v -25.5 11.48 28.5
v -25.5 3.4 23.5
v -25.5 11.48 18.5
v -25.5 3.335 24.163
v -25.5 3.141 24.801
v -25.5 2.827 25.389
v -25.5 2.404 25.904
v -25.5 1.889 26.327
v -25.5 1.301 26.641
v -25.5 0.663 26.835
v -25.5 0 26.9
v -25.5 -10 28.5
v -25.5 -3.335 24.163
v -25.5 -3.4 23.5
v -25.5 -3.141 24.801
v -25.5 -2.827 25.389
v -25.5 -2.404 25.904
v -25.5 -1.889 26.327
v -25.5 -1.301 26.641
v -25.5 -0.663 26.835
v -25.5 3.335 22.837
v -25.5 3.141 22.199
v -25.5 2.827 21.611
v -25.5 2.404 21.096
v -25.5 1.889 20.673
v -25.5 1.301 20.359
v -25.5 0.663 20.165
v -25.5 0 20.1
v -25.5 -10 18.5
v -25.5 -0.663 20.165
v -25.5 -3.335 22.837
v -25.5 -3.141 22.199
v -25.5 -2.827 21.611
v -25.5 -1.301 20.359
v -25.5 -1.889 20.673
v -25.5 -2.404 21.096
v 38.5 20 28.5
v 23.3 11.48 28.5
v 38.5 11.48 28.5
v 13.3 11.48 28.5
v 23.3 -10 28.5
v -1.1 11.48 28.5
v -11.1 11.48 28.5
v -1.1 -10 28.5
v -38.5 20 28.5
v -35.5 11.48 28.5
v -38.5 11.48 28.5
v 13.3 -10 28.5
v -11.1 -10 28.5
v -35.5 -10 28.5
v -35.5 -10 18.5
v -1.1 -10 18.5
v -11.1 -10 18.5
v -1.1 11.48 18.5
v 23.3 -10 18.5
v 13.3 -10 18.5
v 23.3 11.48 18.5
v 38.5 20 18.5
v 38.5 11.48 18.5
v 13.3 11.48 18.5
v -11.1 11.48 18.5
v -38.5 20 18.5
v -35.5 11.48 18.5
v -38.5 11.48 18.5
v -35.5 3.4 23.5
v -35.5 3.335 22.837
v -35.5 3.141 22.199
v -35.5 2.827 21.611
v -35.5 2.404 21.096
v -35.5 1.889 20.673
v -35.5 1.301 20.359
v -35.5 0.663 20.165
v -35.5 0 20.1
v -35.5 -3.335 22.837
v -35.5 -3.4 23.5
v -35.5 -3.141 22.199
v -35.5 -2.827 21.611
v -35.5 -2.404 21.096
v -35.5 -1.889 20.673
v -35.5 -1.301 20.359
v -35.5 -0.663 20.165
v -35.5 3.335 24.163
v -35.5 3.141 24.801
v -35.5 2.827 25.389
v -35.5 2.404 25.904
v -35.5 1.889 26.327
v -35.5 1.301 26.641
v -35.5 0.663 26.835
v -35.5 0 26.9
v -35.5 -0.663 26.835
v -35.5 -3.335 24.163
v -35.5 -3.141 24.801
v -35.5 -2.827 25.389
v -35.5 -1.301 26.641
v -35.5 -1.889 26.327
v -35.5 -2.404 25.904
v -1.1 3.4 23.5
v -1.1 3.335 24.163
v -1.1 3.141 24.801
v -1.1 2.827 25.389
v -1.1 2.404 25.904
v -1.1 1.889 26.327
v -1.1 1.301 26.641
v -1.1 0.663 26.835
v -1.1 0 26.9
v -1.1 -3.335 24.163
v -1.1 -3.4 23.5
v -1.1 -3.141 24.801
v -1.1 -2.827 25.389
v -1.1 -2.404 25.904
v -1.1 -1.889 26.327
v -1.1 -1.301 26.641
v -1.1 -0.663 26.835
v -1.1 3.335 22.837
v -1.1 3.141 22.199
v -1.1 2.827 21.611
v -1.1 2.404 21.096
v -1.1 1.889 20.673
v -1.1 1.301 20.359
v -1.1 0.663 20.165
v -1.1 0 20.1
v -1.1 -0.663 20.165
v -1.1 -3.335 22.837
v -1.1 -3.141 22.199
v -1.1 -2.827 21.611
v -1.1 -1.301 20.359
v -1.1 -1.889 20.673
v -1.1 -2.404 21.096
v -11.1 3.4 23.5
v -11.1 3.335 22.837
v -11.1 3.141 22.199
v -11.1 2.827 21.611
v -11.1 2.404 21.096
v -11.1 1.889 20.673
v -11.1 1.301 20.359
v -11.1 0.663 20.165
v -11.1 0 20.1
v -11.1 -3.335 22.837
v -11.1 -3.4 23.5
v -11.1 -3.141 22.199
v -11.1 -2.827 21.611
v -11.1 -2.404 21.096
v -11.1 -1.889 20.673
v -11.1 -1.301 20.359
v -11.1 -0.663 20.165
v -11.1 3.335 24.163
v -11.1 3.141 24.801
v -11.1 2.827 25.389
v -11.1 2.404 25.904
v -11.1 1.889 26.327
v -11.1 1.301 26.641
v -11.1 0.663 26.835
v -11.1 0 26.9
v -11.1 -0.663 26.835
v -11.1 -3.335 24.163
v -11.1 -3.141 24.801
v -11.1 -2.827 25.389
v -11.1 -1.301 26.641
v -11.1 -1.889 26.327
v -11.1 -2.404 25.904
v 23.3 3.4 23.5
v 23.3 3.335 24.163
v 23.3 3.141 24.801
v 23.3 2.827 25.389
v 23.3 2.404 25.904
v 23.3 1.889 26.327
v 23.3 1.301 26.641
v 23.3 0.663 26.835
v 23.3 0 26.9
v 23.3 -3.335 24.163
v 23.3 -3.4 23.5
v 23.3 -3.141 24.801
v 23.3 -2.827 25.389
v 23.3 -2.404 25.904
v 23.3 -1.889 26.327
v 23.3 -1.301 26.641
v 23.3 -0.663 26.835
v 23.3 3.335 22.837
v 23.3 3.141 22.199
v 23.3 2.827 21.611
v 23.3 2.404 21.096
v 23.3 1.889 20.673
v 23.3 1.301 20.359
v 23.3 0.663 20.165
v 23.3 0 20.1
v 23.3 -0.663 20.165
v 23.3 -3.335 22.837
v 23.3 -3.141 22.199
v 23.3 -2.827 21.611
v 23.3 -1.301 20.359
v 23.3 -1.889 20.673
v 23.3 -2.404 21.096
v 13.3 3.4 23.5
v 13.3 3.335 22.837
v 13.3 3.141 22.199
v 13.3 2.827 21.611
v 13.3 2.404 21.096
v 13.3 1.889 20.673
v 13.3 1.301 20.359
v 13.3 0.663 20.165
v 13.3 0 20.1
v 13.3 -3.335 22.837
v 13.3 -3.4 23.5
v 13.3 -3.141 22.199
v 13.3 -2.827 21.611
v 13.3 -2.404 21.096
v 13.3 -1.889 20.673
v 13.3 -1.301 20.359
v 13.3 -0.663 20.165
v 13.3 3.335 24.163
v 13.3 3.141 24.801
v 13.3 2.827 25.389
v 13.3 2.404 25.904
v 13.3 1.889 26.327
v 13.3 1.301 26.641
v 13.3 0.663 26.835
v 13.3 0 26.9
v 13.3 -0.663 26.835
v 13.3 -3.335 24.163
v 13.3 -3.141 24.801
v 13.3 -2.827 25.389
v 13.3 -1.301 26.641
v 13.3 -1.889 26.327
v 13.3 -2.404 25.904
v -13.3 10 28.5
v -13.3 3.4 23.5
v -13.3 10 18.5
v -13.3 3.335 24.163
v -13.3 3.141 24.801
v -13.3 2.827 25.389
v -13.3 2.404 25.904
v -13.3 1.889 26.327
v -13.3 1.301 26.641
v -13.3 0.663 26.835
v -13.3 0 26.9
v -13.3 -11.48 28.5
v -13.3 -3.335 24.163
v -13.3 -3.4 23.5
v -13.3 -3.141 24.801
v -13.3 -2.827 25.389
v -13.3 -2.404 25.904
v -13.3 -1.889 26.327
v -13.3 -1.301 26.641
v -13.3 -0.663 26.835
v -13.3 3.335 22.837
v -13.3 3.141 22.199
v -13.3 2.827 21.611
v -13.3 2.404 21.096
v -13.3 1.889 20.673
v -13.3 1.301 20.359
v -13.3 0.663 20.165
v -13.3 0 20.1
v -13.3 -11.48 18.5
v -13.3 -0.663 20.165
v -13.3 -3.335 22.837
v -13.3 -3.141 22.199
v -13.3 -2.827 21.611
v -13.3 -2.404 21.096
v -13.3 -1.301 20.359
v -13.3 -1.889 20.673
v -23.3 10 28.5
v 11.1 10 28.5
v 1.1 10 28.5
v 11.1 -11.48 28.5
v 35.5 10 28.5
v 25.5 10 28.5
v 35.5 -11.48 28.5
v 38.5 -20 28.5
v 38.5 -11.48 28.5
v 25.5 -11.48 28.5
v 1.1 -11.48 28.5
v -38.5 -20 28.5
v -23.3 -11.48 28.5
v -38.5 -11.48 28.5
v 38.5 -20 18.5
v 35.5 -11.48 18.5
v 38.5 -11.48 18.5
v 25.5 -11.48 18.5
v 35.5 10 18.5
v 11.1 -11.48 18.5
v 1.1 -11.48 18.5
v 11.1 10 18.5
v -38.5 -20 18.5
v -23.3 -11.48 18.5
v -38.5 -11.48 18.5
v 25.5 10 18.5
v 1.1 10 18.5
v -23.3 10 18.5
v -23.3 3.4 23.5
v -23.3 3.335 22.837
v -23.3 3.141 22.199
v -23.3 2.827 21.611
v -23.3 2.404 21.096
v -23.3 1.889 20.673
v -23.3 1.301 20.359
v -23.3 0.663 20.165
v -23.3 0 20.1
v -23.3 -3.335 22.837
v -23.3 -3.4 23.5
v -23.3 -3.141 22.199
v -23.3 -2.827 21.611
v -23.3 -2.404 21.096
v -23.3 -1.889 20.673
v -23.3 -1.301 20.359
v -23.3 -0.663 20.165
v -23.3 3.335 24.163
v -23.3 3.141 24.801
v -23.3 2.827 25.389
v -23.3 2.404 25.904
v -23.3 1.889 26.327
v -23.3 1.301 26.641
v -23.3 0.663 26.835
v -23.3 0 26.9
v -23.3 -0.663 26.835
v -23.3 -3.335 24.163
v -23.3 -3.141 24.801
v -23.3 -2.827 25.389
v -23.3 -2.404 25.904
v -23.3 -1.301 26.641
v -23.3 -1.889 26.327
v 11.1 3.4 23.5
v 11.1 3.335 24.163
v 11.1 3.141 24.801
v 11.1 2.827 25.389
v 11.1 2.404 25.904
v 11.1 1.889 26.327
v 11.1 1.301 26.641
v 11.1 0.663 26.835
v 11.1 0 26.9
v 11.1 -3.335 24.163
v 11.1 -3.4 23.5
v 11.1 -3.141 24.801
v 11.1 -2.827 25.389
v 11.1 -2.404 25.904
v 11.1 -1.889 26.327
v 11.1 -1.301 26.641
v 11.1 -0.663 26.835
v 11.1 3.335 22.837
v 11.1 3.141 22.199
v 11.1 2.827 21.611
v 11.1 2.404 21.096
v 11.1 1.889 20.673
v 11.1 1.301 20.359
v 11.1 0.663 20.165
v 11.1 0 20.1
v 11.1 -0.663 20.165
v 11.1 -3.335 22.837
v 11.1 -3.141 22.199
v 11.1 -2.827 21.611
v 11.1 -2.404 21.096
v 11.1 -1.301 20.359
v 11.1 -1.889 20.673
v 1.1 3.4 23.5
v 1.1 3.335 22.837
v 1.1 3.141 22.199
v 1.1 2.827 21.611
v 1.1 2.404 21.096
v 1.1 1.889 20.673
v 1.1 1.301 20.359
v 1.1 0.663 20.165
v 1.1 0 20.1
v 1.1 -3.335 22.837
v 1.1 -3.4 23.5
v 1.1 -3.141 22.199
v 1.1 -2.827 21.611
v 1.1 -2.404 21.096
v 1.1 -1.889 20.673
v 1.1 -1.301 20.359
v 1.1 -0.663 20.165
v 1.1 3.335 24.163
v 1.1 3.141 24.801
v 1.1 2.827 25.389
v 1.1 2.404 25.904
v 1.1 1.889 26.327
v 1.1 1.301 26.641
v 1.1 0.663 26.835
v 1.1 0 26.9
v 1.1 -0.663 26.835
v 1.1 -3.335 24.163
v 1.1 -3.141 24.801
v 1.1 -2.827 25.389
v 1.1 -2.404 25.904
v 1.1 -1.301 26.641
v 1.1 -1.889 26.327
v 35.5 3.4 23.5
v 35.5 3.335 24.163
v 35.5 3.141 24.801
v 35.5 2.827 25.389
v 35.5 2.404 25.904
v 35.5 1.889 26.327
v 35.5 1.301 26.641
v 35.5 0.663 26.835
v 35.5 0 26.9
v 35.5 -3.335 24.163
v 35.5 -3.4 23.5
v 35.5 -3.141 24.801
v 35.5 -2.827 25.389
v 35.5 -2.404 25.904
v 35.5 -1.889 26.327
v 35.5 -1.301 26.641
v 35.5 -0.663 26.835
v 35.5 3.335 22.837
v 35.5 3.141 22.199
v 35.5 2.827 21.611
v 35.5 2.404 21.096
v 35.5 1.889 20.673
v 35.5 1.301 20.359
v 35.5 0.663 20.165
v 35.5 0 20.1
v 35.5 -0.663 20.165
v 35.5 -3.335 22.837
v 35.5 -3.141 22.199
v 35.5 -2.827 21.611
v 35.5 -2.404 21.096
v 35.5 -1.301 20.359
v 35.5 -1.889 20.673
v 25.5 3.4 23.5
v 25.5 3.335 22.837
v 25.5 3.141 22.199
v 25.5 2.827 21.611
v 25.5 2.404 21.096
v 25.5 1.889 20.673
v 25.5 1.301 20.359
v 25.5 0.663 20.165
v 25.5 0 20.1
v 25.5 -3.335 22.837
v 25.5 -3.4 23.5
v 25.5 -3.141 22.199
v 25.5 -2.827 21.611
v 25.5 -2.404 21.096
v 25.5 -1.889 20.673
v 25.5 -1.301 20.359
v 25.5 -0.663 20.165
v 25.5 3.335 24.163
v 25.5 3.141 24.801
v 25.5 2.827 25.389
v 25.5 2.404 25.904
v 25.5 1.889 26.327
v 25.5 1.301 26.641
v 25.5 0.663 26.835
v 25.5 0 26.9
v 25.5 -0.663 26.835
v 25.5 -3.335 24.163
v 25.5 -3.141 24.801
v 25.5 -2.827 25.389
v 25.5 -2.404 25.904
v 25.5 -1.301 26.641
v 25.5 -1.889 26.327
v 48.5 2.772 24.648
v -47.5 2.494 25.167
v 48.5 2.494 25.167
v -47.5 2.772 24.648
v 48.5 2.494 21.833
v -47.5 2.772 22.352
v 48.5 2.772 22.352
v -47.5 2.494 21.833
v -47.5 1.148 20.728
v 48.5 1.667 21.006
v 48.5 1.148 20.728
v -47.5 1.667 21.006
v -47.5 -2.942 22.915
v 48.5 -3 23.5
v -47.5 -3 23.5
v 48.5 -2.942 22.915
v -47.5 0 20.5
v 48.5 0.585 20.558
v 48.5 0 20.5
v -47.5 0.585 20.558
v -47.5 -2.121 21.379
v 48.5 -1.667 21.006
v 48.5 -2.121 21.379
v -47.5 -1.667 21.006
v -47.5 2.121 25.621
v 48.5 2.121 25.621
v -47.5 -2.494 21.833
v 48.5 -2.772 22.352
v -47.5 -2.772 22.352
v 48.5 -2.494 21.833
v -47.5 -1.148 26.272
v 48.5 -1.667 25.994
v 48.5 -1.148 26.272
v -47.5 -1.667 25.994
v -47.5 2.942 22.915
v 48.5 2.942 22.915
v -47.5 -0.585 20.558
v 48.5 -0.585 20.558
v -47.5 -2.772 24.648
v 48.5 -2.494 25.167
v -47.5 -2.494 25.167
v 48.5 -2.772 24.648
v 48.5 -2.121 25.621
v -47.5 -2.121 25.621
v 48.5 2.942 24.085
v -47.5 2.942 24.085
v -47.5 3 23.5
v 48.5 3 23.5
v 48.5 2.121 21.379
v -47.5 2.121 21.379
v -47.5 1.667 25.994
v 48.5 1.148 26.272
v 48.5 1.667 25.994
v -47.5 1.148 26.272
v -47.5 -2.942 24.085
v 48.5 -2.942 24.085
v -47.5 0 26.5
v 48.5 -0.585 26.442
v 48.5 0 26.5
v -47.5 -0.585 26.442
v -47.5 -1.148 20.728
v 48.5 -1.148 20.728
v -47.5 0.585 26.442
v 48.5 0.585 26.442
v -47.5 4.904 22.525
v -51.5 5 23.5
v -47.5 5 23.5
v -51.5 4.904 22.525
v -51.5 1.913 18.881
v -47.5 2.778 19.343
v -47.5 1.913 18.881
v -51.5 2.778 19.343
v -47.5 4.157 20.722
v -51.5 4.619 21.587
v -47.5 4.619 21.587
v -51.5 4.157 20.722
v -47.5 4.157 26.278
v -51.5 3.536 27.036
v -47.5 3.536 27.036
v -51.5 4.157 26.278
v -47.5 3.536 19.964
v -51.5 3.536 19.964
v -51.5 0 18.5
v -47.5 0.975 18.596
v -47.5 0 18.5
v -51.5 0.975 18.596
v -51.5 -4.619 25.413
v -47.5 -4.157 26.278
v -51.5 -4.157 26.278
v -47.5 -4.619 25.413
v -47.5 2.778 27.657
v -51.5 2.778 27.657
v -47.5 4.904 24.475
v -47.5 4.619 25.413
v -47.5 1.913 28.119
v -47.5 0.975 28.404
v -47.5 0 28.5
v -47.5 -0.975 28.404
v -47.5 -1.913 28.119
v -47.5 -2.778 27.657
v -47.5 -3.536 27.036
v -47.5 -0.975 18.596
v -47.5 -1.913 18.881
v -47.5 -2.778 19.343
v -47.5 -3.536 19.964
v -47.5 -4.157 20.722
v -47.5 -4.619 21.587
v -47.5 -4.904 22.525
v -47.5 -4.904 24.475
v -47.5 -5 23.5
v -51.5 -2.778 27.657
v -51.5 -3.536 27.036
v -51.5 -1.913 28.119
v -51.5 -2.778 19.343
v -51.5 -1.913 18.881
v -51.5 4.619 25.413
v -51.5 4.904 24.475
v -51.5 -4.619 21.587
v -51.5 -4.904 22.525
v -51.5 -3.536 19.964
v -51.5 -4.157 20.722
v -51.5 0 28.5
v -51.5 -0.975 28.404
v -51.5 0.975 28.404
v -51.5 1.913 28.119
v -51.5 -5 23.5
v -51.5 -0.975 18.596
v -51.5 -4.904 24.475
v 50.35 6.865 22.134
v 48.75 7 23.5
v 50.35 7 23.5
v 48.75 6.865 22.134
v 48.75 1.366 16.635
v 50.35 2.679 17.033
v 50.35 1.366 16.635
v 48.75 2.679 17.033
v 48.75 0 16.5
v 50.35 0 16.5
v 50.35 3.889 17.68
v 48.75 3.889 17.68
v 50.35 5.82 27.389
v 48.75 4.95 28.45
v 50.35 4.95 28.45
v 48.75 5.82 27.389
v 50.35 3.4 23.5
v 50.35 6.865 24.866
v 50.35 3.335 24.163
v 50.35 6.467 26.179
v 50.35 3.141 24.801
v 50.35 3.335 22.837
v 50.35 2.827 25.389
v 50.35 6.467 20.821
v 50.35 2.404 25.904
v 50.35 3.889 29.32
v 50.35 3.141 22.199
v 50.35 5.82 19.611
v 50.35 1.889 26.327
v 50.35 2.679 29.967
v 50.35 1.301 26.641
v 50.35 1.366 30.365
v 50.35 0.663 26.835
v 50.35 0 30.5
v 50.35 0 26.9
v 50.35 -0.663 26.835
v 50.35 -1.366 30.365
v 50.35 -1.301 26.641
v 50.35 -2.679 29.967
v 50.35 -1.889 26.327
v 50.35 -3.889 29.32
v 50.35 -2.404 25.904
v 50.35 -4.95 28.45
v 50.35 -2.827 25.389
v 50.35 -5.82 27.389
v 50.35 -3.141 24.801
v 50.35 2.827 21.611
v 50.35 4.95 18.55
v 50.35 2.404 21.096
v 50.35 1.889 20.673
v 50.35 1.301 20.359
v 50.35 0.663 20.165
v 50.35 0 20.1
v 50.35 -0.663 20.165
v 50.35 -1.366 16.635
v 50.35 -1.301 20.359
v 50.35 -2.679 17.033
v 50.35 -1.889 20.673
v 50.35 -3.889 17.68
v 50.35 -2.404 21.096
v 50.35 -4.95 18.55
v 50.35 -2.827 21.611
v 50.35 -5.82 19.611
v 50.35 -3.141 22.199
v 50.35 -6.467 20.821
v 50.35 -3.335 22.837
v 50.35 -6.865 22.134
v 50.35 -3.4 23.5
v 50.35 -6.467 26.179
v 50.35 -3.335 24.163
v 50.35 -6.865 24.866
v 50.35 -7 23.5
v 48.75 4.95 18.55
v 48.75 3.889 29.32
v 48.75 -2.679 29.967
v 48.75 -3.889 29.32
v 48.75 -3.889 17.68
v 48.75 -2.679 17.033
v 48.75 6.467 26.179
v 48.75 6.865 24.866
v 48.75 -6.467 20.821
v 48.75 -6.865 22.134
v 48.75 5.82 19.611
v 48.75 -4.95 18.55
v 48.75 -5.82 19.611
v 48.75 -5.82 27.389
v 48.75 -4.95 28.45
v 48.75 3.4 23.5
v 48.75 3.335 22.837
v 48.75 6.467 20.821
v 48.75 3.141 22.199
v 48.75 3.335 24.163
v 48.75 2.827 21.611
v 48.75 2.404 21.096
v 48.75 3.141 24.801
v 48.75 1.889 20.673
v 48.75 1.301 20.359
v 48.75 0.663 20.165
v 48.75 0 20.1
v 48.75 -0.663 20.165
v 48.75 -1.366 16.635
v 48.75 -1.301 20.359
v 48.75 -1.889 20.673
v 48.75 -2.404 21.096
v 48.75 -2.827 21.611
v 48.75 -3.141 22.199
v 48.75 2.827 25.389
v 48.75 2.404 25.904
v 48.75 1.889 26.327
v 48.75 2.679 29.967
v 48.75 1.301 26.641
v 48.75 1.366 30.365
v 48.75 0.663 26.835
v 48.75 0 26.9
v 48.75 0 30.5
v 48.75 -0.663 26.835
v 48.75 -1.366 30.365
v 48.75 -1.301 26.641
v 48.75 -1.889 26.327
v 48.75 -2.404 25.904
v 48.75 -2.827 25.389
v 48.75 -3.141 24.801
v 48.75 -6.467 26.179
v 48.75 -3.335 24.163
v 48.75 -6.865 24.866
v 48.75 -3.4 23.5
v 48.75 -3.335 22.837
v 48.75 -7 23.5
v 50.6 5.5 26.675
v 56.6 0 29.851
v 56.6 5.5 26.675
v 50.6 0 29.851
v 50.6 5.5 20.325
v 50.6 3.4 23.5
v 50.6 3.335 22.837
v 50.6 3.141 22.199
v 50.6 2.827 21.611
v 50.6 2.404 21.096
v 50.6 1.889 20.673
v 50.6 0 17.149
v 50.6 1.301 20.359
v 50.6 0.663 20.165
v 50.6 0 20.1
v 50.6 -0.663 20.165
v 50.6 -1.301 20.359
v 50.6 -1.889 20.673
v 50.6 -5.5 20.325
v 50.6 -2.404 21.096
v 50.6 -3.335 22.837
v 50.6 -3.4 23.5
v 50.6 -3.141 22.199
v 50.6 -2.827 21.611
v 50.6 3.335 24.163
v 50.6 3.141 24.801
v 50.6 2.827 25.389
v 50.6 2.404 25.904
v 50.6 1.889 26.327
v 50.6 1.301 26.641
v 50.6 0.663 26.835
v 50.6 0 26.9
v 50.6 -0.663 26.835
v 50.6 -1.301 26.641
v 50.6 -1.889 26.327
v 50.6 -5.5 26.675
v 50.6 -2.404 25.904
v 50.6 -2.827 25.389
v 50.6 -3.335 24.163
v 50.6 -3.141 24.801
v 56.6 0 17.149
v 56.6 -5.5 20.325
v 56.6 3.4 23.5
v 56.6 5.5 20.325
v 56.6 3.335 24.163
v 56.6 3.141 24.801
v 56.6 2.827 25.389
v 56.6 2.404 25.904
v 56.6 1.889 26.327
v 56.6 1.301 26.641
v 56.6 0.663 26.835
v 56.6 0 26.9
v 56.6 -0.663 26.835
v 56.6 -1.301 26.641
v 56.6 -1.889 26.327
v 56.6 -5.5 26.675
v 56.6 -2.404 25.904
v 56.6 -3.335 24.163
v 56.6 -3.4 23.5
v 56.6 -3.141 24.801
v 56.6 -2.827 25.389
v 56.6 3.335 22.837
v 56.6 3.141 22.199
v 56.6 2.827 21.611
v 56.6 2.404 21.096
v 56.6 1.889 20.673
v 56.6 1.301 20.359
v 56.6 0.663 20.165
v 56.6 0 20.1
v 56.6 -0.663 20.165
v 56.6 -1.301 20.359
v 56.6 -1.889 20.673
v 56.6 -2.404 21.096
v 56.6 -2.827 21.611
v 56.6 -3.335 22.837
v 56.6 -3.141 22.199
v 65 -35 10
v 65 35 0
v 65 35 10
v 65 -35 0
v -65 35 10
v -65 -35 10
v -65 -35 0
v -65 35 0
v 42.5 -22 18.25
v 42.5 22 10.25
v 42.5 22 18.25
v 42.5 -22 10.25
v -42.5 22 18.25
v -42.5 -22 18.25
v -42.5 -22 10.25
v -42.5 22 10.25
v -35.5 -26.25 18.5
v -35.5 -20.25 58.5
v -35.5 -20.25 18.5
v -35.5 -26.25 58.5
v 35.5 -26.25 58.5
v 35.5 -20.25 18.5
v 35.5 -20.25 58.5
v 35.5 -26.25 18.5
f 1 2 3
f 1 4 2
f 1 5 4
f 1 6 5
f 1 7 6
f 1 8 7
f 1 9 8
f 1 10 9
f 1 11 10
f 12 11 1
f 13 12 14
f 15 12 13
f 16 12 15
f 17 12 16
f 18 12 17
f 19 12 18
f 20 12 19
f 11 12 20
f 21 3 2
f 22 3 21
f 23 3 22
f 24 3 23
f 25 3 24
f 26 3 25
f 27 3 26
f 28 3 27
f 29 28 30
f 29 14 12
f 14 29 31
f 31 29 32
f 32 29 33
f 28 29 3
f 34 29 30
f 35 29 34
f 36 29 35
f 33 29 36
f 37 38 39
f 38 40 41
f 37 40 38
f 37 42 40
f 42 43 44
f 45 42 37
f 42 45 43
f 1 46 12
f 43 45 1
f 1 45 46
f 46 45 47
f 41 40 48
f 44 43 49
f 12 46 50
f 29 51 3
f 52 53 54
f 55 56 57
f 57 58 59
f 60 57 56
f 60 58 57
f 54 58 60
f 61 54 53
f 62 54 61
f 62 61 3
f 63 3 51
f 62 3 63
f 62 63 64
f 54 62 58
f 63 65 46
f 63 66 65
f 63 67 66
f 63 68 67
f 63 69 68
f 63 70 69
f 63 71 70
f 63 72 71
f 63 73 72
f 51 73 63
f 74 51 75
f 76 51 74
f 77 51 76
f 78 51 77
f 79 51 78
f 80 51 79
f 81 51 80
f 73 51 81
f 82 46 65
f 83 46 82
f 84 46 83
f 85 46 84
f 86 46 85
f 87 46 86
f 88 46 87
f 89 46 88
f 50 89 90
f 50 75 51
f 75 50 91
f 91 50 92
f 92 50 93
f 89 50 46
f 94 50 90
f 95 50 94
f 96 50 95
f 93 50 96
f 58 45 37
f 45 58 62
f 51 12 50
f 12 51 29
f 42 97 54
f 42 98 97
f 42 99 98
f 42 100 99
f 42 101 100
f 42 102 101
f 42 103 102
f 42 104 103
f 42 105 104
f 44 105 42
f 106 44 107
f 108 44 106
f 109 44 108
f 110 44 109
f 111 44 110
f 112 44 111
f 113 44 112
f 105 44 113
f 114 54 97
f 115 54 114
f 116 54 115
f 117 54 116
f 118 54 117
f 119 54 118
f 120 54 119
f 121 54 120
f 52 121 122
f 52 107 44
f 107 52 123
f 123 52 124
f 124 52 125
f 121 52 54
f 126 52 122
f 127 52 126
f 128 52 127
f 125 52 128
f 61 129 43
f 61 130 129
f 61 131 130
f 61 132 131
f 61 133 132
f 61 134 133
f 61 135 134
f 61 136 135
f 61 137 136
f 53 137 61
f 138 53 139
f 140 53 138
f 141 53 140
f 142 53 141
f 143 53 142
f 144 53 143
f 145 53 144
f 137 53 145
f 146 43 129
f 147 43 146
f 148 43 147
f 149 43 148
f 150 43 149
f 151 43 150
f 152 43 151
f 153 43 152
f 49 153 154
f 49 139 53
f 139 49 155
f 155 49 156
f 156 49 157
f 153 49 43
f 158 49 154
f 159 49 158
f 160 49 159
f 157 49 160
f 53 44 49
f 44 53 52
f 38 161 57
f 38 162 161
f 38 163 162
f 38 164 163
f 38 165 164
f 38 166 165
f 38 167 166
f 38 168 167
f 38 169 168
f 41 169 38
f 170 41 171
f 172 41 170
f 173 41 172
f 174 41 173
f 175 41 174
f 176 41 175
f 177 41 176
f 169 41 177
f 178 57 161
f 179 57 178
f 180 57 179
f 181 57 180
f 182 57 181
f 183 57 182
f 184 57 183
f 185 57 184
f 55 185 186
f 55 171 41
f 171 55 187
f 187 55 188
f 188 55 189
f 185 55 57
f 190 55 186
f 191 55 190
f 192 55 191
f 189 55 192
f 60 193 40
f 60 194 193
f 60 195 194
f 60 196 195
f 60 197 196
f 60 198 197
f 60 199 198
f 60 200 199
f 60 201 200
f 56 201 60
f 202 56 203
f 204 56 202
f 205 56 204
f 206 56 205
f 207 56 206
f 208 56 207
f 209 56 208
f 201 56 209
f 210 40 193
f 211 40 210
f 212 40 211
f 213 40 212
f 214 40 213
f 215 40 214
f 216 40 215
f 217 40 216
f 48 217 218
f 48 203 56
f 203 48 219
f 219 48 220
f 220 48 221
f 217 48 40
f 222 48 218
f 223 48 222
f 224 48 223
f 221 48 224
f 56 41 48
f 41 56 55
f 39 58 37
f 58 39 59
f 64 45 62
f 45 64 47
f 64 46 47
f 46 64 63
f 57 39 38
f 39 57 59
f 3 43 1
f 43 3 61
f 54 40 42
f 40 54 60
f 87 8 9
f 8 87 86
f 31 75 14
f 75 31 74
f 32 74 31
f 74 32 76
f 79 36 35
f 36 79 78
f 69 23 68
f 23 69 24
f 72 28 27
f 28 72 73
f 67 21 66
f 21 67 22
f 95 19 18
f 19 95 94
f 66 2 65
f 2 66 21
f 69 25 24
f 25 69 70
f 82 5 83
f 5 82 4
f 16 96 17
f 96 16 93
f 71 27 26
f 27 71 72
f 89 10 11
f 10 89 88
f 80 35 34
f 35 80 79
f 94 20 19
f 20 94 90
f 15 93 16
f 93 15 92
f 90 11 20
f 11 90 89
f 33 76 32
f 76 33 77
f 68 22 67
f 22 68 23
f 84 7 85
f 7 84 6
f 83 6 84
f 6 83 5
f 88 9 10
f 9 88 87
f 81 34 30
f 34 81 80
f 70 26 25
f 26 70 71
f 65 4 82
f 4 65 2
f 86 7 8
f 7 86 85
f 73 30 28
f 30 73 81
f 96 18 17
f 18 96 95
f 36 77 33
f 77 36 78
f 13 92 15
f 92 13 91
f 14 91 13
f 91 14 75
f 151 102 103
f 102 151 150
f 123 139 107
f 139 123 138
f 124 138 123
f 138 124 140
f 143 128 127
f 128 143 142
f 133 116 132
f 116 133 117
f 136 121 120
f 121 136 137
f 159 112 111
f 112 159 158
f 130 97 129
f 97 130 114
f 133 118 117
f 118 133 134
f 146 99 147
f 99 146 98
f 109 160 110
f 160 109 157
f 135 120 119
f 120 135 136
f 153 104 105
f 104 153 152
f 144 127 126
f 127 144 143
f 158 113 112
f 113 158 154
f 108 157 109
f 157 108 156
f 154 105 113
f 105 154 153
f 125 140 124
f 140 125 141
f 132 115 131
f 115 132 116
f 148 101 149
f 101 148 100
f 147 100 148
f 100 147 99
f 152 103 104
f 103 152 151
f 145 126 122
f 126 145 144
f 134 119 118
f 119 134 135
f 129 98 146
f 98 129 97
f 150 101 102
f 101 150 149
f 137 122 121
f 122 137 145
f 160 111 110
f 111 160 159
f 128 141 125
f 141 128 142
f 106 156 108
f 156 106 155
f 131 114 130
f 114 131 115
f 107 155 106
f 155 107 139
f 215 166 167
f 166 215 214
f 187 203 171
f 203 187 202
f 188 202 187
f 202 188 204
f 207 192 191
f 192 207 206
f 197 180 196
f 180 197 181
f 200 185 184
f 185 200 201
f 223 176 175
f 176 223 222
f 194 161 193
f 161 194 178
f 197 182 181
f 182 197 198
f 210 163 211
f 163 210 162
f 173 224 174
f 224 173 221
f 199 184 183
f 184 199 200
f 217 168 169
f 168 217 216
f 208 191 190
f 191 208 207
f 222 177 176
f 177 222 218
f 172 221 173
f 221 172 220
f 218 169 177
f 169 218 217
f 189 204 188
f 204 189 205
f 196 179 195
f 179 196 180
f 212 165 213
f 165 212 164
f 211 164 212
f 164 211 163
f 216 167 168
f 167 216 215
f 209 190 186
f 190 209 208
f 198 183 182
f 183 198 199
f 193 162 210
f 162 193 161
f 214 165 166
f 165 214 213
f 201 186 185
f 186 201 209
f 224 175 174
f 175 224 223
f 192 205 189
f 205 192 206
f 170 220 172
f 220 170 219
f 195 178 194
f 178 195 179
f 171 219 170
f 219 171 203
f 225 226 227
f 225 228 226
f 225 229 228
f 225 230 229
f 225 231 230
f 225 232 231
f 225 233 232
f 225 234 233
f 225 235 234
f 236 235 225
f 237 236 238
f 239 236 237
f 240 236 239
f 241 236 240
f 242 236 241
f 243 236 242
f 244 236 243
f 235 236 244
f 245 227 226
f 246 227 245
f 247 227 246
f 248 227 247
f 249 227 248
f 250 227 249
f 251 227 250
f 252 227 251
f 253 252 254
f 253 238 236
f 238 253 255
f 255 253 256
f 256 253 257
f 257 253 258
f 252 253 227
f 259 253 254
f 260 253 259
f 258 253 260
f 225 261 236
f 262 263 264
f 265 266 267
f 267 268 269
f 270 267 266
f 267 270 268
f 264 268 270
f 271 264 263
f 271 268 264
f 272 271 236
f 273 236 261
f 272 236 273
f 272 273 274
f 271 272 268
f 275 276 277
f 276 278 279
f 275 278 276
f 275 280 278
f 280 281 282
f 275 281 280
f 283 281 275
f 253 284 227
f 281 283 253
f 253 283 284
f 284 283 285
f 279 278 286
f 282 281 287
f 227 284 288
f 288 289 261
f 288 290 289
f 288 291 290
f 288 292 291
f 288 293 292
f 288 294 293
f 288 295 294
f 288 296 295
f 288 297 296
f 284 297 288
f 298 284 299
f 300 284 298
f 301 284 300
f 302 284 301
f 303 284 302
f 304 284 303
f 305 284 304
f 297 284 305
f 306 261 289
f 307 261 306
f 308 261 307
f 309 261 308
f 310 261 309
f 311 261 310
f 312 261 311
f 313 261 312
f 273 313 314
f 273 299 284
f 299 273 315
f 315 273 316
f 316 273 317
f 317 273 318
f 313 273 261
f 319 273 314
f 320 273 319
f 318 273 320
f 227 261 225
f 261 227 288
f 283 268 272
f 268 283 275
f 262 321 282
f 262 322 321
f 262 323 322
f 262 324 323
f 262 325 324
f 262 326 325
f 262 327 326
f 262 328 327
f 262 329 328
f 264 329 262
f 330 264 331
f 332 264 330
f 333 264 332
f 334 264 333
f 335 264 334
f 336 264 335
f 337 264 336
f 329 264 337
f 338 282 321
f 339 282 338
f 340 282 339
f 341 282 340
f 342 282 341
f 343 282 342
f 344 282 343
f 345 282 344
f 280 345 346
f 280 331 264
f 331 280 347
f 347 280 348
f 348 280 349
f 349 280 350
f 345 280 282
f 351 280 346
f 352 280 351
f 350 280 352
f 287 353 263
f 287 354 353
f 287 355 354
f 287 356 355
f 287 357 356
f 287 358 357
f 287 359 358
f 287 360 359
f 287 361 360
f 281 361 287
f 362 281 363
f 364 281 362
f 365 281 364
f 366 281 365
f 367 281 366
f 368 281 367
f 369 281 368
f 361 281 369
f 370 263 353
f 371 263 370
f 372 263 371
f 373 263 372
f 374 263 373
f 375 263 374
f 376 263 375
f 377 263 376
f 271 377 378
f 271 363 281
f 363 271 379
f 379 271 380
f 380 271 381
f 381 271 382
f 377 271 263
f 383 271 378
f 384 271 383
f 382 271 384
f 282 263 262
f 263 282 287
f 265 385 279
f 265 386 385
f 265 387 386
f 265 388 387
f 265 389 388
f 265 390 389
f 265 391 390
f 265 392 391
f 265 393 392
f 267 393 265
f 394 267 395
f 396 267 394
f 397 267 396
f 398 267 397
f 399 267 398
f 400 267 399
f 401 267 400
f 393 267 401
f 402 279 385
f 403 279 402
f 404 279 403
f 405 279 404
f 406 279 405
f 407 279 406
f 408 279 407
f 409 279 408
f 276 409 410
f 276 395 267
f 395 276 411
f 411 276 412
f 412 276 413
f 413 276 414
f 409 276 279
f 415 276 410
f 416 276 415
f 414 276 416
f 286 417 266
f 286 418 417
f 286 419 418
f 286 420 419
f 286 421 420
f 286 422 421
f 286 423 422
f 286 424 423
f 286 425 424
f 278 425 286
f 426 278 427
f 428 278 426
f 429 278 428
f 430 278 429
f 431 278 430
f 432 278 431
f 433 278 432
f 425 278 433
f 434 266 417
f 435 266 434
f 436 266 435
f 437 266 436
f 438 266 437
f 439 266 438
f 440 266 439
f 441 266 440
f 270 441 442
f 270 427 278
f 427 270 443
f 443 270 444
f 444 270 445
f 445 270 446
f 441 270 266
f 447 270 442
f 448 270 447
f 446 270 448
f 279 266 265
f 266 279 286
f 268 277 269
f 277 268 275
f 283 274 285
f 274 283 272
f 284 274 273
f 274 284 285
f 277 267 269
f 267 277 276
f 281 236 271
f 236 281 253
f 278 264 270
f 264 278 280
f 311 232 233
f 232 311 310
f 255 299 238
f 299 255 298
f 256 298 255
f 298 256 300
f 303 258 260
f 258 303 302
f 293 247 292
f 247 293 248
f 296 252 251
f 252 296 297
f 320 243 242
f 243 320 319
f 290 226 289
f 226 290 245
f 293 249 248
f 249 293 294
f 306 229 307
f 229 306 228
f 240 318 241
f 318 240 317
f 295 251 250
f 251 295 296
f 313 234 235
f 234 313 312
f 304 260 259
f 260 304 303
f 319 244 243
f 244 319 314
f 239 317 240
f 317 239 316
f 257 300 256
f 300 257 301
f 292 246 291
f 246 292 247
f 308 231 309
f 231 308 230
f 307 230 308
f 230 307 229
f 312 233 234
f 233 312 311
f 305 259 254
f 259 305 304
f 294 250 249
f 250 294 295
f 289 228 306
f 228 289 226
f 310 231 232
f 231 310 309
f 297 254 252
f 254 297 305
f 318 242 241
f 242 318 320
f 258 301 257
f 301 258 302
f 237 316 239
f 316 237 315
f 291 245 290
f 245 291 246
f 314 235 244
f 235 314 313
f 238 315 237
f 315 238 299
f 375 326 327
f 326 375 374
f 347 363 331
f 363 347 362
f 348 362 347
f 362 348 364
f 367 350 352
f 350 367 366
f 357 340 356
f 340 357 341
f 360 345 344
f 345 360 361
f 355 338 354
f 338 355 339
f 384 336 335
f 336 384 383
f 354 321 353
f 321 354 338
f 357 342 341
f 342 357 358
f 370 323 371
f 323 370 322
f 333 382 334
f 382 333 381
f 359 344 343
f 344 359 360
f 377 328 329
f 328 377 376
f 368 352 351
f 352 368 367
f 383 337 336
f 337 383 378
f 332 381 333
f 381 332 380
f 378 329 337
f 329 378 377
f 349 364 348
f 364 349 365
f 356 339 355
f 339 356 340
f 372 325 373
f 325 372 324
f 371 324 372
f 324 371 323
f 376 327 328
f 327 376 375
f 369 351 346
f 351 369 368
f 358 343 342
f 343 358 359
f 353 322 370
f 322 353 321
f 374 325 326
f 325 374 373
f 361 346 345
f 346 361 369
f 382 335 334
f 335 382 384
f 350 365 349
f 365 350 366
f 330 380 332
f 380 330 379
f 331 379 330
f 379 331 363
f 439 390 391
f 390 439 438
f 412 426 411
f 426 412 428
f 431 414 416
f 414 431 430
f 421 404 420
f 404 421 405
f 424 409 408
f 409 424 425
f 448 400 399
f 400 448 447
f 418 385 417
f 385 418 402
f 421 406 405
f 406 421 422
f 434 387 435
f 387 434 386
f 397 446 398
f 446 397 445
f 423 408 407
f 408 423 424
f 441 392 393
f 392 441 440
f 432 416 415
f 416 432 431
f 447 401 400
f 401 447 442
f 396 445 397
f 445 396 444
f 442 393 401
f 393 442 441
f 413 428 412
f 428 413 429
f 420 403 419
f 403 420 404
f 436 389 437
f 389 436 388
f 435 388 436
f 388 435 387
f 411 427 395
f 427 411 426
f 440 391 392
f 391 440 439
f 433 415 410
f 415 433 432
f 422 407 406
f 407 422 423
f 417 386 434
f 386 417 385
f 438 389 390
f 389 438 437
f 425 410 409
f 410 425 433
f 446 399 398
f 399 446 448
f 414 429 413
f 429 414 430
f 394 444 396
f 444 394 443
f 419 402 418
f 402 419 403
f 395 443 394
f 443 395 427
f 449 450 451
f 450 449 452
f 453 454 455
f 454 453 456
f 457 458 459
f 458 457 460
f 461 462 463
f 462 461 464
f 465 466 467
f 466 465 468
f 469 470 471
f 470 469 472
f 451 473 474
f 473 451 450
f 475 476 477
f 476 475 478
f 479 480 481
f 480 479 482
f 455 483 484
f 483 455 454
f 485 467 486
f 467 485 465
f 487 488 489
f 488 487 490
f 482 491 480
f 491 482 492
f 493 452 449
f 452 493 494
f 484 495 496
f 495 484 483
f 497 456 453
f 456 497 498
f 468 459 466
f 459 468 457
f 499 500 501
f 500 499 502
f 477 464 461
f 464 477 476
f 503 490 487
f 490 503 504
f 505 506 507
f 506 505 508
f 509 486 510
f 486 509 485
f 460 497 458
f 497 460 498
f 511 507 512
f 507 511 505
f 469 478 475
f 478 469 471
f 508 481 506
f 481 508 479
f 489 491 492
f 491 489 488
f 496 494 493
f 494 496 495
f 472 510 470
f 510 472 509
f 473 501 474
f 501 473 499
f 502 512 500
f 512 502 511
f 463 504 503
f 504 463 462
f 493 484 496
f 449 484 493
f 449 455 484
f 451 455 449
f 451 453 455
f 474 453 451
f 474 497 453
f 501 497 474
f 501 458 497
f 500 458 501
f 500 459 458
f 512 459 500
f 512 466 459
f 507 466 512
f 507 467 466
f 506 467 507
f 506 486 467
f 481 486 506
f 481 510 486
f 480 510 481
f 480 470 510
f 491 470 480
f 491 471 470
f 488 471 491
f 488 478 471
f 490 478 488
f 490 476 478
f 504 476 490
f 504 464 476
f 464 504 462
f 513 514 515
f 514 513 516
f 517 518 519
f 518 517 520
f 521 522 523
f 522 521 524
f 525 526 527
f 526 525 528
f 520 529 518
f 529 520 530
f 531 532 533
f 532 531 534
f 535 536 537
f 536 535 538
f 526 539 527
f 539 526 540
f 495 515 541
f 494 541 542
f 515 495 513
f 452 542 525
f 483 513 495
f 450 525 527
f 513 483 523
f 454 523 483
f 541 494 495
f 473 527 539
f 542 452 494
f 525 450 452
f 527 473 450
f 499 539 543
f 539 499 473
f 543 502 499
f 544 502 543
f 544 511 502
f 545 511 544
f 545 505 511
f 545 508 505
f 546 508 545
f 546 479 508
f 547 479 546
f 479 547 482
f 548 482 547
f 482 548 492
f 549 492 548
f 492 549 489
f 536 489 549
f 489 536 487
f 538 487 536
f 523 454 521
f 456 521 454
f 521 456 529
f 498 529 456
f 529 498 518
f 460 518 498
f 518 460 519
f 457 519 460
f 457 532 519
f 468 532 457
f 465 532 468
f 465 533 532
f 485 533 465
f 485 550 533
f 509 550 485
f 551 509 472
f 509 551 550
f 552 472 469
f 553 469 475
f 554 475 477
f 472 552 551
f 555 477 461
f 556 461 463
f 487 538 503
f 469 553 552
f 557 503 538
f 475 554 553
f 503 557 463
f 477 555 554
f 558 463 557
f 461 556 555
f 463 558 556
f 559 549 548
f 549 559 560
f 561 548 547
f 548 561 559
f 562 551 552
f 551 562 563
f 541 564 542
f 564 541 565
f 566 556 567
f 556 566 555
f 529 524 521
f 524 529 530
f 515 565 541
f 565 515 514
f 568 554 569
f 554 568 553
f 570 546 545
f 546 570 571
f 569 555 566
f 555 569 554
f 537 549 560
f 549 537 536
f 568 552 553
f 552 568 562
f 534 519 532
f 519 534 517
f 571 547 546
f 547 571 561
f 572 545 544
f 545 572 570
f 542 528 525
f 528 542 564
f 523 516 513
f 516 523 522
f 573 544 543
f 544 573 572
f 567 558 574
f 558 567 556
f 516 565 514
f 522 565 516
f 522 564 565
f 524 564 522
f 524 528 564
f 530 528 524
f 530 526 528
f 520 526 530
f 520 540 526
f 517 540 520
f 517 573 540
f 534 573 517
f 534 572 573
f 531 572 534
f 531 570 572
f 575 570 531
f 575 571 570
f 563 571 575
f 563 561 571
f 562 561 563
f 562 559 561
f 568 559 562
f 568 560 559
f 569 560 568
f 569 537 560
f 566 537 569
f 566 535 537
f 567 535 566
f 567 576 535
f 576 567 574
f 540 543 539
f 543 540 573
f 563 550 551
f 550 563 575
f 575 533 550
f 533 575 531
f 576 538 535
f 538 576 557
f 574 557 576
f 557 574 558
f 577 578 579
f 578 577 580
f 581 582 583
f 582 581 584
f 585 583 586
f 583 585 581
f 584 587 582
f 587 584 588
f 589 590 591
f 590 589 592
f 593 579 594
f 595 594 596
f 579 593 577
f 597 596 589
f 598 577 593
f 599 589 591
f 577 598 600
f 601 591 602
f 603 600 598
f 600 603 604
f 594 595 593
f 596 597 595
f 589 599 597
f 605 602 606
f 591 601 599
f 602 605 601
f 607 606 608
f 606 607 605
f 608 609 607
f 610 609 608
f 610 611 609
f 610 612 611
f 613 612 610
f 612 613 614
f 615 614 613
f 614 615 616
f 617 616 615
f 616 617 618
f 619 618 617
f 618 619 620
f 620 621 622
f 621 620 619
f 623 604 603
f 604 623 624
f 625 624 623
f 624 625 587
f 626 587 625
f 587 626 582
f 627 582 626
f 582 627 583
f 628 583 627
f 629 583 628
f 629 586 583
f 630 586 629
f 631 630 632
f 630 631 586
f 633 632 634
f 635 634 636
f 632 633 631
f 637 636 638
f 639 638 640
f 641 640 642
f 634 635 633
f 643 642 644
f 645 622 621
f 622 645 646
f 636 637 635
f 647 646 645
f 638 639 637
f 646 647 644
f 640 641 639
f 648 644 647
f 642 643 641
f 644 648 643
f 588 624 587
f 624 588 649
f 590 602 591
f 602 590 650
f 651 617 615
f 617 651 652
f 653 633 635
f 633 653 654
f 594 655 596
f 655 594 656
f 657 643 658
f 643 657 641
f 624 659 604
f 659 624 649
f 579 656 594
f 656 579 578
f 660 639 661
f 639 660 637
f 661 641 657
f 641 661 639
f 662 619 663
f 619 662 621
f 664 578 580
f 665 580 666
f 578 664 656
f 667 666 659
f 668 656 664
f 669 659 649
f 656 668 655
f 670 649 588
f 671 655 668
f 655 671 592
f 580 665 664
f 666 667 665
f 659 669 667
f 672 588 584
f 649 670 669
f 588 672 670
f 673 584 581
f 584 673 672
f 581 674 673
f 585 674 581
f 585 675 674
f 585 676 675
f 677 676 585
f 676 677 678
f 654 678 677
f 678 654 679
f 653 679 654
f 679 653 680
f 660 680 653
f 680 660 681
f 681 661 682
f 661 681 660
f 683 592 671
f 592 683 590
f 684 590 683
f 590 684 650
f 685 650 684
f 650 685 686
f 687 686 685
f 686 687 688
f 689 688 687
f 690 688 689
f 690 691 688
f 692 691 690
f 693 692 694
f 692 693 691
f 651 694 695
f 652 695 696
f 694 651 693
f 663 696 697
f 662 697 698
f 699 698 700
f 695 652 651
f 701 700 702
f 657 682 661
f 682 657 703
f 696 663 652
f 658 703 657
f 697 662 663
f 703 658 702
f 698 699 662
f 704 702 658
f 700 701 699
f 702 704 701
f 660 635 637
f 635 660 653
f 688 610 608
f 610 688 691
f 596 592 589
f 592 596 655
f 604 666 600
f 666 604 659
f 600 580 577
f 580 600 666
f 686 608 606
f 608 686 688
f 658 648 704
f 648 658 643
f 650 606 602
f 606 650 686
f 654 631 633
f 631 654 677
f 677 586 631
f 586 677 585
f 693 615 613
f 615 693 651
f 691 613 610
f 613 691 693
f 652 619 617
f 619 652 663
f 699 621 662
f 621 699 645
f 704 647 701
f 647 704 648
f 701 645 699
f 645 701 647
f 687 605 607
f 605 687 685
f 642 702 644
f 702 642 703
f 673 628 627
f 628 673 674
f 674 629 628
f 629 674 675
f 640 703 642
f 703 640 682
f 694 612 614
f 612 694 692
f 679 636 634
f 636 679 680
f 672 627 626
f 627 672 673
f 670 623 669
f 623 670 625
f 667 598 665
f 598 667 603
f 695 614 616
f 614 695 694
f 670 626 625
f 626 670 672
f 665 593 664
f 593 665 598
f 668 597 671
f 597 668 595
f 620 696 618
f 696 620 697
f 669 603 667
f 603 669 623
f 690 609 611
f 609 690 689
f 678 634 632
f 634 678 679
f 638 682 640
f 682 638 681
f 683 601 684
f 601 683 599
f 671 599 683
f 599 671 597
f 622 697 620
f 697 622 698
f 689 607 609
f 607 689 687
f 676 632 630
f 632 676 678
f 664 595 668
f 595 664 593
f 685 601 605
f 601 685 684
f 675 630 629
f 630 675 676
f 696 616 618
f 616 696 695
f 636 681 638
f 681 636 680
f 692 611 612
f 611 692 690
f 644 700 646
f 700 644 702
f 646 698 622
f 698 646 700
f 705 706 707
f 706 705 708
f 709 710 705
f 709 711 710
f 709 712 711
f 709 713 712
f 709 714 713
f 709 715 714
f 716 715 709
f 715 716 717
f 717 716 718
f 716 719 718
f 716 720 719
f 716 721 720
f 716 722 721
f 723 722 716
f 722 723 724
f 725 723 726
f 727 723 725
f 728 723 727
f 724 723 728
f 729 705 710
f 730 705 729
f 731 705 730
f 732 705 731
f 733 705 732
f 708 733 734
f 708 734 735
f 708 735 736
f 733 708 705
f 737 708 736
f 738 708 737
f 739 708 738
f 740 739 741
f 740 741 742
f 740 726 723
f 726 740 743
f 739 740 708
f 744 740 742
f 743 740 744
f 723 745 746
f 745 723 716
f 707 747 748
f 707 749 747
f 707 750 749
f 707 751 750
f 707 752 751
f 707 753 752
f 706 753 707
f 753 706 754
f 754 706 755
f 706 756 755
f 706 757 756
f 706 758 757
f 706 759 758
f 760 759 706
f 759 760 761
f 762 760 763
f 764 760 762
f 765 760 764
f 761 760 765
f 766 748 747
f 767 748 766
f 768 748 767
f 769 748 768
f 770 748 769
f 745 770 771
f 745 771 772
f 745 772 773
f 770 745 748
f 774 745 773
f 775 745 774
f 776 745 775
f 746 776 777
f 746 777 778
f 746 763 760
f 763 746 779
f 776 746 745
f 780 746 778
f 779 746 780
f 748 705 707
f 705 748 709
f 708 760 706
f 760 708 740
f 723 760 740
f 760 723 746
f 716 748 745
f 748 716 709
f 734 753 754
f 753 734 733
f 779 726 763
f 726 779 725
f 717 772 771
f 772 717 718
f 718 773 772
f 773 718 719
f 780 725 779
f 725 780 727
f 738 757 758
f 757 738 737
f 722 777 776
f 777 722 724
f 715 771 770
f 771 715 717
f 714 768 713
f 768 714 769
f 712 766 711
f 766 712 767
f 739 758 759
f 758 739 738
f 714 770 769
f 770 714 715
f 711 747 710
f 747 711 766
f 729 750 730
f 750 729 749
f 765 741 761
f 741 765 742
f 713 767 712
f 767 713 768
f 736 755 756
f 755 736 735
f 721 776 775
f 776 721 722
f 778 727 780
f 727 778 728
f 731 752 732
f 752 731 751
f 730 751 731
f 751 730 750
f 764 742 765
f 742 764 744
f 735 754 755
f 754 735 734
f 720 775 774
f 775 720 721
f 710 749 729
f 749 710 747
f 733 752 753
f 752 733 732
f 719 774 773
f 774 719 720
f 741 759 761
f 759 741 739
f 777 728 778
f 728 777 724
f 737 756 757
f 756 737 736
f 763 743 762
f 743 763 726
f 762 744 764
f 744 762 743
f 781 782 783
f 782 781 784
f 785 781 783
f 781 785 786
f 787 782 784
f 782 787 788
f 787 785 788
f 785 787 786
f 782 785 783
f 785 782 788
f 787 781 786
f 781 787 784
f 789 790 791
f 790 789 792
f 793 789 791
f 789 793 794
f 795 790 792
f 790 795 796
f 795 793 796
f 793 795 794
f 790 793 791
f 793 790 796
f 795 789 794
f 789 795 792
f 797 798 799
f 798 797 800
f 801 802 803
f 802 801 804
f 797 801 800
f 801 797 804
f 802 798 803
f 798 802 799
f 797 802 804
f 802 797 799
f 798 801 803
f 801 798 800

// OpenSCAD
$fn = 32;

// ------------------------------------------------------------------------
// Comb hinge with flap: leaf 77 x 20 mm, pin d6, flap 40 mm
// Every part is its own module, assembly() places every instance.
// ------------------------------------------------------------------------

// --- part 1 ---
module hinge_bed() {
  difference() {
    translate([-65, -35, 0]) cube([130, 70, 10]);
  }
}

// --- part 2 ---
module hinge_riser() {
  difference() {
    translate([-42.5, -22, 0]) cube([85, 44, 8]);
  }
}

// --- part 3 ---
module hinge_leaf_a() {
  difference() {
    union() {
      translate([-35.5, -10, -5]) cube([10, 30, 10]);
      translate([-11.1, -10, -5]) cube([10, 30, 10]);
      translate([13.3, -10, -5]) cube([10, 30, 10]);
      translate([-38.5, 11.48, -5]) cube([77, 8.52, 10]);
    }
    translate([-30.5, 0, 0]) rotate([0, 90, 0]) cylinder(h = 12, d = 6.8, center = true);
    translate([-6.1, 0, 0]) rotate([0, 90, 0]) cylinder(h = 12, d = 6.8, center = true);
    translate([18.3, 0, 0]) rotate([0, 90, 0]) cylinder(h = 12, d = 6.8, center = true);
  }
}

// --- part 4 ---
module hinge_leaf_b() {
  difference() {
    union() {
      translate([-23.3, -20, -5]) cube([10, 30, 10]);
      translate([1.1, -20, -5]) cube([10, 30, 10]);
      translate([25.5, -20, -5]) cube([10, 30, 10]);
      translate([-38.5, -20, -5]) cube([77, 8.52, 10]);
    }
    translate([-18.3, 0, 0]) rotate([0, 90, 0]) cylinder(h = 12, d = 6.8, center = true);
    translate([6.1, 0, 0]) rotate([0, 90, 0]) cylinder(h = 12, d = 6.8, center = true);
    translate([30.5, 0, 0]) rotate([0, 90, 0]) cylinder(h = 12, d = 6.8, center = true);
  }
}

// --- part 5 ---
module hinge_flap() {
  difference() {
    translate([-35.5, -20, 0]) cube([71, 40, 6]);
  }
}

// --- part 6 ---
module hinge_pin() {
  rotate([0, 90, 0]) cylinder(h = 97, d = 6, center = true);
  translate([-51.5, 0, 0]) rotate([0, 90, 0]) cylinder(h = 4, d = 10);
}

// --- part 7 ---
module pin_washer() {
  difference() {
      translate([0, 0, 0]) cylinder(h = 1.6, d = 14);
      translate([0, 0, -1]) cylinder(h = 3.6, d = 6.8);
    }
}

// --- part 8 ---
module pin_nut() {
  difference() {
    linear_extrude(height = 6) polygon(points = [[6.351, 0], [3.175, 5.5], [-3.175, 5.5], [-6.351, 0], [-3.175, -5.5], [3.175, -5.5]]);
    translate([0, 0, -1]) cylinder(h = 8, d = 6.8);
  }
}

// --- assembly ---
module assembly() {
  color([0.80, 0.24, 0.20]) translate([0, 0, 0]) rotate([0, 0, 0]) hinge_bed();
  color([0.20, 0.45, 0.75]) translate([0, 0, 10.25]) rotate([0, 0, 0]) hinge_riser();
  color([0.25, 0.62, 0.32]) translate([0, 0, 23.5]) rotate([0, 0, 0]) hinge_leaf_a();
  color([0.92, 0.70, 0.18]) translate([0, 0, 23.5]) rotate([0, 0, 0]) hinge_leaf_b();
  color([0.58, 0.35, 0.70]) translate([0, -20.25, 38.5]) rotate([90, 0, 0]) hinge_flap();
  color([0.16, 0.66, 0.66]) translate([0, 0, 23.5]) rotate([0, 0, 0]) hinge_pin();
  color([0.85, 0.48, 0.18]) translate([48.75, 0, 23.5]) rotate([0, 90, 0]) pin_washer();
  color([0.55, 0.60, 0.65]) translate([50.6, 0, 23.5]) rotate([0, 90, 0]) pin_nut();
}

assembly();
